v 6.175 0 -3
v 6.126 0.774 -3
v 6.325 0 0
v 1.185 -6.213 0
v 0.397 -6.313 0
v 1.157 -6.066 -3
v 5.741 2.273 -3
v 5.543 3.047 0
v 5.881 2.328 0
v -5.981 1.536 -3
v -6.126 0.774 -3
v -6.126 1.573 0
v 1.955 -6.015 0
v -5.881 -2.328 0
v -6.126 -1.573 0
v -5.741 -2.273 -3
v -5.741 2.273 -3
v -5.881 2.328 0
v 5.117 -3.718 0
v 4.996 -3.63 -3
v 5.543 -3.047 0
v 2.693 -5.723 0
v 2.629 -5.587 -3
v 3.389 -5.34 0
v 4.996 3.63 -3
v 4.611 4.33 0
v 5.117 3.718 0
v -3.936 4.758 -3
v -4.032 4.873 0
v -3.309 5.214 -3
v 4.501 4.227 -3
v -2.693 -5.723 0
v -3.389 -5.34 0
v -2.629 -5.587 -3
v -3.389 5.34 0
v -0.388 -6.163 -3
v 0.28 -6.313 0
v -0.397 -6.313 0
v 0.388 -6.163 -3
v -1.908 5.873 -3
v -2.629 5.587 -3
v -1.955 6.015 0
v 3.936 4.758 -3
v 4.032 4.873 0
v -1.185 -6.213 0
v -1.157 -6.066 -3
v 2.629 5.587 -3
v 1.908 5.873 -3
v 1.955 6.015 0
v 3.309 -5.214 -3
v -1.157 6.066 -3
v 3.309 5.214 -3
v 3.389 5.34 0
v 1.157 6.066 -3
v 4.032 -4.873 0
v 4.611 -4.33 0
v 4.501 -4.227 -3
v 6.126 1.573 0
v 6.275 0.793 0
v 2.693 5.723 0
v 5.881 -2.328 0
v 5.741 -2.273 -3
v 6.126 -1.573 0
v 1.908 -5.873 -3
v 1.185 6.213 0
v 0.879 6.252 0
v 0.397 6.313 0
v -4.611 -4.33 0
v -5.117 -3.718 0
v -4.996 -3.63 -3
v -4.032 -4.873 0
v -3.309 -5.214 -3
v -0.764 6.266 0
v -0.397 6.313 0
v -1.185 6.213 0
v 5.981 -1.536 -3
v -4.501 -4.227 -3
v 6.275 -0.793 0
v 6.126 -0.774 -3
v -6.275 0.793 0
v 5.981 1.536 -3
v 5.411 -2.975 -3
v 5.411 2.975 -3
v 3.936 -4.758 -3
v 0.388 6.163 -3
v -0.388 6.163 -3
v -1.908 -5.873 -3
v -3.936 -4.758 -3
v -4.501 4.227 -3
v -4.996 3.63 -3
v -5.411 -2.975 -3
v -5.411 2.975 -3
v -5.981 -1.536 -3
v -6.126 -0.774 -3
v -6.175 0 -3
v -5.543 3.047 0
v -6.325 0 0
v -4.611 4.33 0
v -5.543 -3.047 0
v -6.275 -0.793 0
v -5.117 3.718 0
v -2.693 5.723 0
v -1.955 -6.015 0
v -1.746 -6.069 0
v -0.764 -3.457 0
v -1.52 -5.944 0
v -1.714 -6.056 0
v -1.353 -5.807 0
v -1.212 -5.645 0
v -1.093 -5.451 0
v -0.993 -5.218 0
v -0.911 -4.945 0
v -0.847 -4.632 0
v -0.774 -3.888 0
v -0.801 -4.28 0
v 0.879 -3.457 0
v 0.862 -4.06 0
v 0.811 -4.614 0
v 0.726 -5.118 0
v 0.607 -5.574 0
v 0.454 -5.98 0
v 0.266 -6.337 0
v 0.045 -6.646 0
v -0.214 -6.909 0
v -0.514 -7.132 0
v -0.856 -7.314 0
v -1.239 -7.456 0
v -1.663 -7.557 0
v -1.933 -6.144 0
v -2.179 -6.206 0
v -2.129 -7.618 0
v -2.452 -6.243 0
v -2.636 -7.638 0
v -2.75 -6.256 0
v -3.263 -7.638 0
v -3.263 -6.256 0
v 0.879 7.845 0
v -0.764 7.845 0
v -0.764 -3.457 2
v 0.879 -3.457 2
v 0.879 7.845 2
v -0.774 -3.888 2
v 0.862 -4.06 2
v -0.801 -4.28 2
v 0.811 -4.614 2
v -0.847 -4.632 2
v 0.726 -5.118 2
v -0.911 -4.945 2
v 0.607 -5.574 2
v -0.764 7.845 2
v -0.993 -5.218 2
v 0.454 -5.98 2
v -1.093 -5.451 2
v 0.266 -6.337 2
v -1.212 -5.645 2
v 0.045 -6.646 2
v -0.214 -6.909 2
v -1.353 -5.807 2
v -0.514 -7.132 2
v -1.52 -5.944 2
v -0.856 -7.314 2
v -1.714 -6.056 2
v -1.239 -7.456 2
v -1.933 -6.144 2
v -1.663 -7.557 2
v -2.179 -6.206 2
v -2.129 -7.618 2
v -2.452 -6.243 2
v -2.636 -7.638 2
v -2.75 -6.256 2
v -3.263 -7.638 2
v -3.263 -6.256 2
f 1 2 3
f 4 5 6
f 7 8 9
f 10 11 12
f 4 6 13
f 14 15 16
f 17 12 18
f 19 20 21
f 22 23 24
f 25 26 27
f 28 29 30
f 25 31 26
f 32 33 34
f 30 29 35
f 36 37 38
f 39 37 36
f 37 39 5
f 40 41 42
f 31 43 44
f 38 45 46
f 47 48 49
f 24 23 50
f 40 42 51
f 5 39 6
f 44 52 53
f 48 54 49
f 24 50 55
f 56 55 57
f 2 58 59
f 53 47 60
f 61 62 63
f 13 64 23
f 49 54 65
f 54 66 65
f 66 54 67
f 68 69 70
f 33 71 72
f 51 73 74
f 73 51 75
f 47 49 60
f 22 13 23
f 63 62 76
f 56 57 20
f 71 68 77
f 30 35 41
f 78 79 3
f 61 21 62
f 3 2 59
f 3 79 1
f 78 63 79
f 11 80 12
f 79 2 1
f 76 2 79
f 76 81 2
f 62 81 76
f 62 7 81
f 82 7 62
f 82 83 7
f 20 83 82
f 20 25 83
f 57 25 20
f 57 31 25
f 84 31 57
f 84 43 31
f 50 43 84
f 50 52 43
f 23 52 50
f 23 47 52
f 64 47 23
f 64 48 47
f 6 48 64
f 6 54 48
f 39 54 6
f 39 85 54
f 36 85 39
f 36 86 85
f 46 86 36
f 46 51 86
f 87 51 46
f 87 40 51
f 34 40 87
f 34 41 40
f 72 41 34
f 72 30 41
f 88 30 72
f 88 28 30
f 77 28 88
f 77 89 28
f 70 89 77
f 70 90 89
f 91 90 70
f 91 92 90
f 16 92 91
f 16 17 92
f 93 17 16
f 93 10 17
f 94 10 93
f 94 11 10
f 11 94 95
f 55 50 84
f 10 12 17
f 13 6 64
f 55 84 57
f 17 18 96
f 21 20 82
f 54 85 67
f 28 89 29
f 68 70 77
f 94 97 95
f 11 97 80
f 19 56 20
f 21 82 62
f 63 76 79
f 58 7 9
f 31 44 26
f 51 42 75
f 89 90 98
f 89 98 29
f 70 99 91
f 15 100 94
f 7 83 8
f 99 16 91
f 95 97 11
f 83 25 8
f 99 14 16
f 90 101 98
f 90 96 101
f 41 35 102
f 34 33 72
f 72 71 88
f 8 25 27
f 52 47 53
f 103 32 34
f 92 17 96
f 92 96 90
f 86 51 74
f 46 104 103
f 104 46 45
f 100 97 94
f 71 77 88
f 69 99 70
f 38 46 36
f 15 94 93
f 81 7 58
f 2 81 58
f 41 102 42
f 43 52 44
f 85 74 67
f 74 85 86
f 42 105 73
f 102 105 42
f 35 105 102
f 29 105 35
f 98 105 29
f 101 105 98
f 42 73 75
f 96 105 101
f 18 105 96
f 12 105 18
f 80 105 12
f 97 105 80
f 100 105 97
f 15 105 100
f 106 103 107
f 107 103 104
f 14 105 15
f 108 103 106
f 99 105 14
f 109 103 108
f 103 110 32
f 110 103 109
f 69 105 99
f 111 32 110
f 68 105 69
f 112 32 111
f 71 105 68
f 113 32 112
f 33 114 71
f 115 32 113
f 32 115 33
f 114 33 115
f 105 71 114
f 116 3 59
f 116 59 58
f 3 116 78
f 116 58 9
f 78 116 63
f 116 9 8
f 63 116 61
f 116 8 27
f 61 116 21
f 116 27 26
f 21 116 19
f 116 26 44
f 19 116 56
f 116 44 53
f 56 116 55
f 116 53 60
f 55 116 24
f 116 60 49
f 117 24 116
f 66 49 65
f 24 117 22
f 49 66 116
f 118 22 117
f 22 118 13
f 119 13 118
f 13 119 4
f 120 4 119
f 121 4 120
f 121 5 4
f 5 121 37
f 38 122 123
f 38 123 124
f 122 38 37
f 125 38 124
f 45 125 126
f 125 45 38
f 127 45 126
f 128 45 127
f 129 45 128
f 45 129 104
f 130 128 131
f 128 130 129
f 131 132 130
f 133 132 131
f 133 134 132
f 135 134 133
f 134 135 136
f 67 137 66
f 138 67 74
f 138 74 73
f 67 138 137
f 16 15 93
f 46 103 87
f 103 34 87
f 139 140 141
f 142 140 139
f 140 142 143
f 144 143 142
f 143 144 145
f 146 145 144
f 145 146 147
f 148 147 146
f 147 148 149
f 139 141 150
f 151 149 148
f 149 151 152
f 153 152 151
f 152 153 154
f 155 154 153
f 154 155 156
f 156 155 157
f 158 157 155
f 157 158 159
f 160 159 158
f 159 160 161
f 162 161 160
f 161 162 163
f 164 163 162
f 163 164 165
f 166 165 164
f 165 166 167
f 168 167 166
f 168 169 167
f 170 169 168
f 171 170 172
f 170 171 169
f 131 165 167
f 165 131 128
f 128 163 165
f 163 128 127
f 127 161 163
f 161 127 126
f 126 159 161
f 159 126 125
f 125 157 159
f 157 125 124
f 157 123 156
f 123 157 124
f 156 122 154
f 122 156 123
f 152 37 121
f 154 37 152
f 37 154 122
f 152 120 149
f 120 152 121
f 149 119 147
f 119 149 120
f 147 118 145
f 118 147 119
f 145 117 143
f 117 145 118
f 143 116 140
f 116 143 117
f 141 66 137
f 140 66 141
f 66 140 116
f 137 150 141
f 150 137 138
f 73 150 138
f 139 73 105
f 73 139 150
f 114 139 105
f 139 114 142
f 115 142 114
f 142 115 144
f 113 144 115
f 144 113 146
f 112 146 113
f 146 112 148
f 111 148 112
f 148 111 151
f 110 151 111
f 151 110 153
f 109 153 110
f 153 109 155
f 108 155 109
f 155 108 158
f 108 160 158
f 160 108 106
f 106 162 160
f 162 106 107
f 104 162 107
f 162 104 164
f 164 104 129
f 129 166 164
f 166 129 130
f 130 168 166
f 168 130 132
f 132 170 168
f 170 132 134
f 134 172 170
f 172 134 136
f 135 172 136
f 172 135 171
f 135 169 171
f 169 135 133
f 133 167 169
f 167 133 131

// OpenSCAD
$fn = 50;

difference() {
	union() {
		translate(v = [0, 0, -3.0]) {
			cylinder(h = 3, r1 = 6.175, r2 = 6.325);
		}
		linear_extrude(height = 2) {
			text(font = "Impact", halign = "center", size = 12, text = "J", valign = "center");
		}
	}
	union();
}
